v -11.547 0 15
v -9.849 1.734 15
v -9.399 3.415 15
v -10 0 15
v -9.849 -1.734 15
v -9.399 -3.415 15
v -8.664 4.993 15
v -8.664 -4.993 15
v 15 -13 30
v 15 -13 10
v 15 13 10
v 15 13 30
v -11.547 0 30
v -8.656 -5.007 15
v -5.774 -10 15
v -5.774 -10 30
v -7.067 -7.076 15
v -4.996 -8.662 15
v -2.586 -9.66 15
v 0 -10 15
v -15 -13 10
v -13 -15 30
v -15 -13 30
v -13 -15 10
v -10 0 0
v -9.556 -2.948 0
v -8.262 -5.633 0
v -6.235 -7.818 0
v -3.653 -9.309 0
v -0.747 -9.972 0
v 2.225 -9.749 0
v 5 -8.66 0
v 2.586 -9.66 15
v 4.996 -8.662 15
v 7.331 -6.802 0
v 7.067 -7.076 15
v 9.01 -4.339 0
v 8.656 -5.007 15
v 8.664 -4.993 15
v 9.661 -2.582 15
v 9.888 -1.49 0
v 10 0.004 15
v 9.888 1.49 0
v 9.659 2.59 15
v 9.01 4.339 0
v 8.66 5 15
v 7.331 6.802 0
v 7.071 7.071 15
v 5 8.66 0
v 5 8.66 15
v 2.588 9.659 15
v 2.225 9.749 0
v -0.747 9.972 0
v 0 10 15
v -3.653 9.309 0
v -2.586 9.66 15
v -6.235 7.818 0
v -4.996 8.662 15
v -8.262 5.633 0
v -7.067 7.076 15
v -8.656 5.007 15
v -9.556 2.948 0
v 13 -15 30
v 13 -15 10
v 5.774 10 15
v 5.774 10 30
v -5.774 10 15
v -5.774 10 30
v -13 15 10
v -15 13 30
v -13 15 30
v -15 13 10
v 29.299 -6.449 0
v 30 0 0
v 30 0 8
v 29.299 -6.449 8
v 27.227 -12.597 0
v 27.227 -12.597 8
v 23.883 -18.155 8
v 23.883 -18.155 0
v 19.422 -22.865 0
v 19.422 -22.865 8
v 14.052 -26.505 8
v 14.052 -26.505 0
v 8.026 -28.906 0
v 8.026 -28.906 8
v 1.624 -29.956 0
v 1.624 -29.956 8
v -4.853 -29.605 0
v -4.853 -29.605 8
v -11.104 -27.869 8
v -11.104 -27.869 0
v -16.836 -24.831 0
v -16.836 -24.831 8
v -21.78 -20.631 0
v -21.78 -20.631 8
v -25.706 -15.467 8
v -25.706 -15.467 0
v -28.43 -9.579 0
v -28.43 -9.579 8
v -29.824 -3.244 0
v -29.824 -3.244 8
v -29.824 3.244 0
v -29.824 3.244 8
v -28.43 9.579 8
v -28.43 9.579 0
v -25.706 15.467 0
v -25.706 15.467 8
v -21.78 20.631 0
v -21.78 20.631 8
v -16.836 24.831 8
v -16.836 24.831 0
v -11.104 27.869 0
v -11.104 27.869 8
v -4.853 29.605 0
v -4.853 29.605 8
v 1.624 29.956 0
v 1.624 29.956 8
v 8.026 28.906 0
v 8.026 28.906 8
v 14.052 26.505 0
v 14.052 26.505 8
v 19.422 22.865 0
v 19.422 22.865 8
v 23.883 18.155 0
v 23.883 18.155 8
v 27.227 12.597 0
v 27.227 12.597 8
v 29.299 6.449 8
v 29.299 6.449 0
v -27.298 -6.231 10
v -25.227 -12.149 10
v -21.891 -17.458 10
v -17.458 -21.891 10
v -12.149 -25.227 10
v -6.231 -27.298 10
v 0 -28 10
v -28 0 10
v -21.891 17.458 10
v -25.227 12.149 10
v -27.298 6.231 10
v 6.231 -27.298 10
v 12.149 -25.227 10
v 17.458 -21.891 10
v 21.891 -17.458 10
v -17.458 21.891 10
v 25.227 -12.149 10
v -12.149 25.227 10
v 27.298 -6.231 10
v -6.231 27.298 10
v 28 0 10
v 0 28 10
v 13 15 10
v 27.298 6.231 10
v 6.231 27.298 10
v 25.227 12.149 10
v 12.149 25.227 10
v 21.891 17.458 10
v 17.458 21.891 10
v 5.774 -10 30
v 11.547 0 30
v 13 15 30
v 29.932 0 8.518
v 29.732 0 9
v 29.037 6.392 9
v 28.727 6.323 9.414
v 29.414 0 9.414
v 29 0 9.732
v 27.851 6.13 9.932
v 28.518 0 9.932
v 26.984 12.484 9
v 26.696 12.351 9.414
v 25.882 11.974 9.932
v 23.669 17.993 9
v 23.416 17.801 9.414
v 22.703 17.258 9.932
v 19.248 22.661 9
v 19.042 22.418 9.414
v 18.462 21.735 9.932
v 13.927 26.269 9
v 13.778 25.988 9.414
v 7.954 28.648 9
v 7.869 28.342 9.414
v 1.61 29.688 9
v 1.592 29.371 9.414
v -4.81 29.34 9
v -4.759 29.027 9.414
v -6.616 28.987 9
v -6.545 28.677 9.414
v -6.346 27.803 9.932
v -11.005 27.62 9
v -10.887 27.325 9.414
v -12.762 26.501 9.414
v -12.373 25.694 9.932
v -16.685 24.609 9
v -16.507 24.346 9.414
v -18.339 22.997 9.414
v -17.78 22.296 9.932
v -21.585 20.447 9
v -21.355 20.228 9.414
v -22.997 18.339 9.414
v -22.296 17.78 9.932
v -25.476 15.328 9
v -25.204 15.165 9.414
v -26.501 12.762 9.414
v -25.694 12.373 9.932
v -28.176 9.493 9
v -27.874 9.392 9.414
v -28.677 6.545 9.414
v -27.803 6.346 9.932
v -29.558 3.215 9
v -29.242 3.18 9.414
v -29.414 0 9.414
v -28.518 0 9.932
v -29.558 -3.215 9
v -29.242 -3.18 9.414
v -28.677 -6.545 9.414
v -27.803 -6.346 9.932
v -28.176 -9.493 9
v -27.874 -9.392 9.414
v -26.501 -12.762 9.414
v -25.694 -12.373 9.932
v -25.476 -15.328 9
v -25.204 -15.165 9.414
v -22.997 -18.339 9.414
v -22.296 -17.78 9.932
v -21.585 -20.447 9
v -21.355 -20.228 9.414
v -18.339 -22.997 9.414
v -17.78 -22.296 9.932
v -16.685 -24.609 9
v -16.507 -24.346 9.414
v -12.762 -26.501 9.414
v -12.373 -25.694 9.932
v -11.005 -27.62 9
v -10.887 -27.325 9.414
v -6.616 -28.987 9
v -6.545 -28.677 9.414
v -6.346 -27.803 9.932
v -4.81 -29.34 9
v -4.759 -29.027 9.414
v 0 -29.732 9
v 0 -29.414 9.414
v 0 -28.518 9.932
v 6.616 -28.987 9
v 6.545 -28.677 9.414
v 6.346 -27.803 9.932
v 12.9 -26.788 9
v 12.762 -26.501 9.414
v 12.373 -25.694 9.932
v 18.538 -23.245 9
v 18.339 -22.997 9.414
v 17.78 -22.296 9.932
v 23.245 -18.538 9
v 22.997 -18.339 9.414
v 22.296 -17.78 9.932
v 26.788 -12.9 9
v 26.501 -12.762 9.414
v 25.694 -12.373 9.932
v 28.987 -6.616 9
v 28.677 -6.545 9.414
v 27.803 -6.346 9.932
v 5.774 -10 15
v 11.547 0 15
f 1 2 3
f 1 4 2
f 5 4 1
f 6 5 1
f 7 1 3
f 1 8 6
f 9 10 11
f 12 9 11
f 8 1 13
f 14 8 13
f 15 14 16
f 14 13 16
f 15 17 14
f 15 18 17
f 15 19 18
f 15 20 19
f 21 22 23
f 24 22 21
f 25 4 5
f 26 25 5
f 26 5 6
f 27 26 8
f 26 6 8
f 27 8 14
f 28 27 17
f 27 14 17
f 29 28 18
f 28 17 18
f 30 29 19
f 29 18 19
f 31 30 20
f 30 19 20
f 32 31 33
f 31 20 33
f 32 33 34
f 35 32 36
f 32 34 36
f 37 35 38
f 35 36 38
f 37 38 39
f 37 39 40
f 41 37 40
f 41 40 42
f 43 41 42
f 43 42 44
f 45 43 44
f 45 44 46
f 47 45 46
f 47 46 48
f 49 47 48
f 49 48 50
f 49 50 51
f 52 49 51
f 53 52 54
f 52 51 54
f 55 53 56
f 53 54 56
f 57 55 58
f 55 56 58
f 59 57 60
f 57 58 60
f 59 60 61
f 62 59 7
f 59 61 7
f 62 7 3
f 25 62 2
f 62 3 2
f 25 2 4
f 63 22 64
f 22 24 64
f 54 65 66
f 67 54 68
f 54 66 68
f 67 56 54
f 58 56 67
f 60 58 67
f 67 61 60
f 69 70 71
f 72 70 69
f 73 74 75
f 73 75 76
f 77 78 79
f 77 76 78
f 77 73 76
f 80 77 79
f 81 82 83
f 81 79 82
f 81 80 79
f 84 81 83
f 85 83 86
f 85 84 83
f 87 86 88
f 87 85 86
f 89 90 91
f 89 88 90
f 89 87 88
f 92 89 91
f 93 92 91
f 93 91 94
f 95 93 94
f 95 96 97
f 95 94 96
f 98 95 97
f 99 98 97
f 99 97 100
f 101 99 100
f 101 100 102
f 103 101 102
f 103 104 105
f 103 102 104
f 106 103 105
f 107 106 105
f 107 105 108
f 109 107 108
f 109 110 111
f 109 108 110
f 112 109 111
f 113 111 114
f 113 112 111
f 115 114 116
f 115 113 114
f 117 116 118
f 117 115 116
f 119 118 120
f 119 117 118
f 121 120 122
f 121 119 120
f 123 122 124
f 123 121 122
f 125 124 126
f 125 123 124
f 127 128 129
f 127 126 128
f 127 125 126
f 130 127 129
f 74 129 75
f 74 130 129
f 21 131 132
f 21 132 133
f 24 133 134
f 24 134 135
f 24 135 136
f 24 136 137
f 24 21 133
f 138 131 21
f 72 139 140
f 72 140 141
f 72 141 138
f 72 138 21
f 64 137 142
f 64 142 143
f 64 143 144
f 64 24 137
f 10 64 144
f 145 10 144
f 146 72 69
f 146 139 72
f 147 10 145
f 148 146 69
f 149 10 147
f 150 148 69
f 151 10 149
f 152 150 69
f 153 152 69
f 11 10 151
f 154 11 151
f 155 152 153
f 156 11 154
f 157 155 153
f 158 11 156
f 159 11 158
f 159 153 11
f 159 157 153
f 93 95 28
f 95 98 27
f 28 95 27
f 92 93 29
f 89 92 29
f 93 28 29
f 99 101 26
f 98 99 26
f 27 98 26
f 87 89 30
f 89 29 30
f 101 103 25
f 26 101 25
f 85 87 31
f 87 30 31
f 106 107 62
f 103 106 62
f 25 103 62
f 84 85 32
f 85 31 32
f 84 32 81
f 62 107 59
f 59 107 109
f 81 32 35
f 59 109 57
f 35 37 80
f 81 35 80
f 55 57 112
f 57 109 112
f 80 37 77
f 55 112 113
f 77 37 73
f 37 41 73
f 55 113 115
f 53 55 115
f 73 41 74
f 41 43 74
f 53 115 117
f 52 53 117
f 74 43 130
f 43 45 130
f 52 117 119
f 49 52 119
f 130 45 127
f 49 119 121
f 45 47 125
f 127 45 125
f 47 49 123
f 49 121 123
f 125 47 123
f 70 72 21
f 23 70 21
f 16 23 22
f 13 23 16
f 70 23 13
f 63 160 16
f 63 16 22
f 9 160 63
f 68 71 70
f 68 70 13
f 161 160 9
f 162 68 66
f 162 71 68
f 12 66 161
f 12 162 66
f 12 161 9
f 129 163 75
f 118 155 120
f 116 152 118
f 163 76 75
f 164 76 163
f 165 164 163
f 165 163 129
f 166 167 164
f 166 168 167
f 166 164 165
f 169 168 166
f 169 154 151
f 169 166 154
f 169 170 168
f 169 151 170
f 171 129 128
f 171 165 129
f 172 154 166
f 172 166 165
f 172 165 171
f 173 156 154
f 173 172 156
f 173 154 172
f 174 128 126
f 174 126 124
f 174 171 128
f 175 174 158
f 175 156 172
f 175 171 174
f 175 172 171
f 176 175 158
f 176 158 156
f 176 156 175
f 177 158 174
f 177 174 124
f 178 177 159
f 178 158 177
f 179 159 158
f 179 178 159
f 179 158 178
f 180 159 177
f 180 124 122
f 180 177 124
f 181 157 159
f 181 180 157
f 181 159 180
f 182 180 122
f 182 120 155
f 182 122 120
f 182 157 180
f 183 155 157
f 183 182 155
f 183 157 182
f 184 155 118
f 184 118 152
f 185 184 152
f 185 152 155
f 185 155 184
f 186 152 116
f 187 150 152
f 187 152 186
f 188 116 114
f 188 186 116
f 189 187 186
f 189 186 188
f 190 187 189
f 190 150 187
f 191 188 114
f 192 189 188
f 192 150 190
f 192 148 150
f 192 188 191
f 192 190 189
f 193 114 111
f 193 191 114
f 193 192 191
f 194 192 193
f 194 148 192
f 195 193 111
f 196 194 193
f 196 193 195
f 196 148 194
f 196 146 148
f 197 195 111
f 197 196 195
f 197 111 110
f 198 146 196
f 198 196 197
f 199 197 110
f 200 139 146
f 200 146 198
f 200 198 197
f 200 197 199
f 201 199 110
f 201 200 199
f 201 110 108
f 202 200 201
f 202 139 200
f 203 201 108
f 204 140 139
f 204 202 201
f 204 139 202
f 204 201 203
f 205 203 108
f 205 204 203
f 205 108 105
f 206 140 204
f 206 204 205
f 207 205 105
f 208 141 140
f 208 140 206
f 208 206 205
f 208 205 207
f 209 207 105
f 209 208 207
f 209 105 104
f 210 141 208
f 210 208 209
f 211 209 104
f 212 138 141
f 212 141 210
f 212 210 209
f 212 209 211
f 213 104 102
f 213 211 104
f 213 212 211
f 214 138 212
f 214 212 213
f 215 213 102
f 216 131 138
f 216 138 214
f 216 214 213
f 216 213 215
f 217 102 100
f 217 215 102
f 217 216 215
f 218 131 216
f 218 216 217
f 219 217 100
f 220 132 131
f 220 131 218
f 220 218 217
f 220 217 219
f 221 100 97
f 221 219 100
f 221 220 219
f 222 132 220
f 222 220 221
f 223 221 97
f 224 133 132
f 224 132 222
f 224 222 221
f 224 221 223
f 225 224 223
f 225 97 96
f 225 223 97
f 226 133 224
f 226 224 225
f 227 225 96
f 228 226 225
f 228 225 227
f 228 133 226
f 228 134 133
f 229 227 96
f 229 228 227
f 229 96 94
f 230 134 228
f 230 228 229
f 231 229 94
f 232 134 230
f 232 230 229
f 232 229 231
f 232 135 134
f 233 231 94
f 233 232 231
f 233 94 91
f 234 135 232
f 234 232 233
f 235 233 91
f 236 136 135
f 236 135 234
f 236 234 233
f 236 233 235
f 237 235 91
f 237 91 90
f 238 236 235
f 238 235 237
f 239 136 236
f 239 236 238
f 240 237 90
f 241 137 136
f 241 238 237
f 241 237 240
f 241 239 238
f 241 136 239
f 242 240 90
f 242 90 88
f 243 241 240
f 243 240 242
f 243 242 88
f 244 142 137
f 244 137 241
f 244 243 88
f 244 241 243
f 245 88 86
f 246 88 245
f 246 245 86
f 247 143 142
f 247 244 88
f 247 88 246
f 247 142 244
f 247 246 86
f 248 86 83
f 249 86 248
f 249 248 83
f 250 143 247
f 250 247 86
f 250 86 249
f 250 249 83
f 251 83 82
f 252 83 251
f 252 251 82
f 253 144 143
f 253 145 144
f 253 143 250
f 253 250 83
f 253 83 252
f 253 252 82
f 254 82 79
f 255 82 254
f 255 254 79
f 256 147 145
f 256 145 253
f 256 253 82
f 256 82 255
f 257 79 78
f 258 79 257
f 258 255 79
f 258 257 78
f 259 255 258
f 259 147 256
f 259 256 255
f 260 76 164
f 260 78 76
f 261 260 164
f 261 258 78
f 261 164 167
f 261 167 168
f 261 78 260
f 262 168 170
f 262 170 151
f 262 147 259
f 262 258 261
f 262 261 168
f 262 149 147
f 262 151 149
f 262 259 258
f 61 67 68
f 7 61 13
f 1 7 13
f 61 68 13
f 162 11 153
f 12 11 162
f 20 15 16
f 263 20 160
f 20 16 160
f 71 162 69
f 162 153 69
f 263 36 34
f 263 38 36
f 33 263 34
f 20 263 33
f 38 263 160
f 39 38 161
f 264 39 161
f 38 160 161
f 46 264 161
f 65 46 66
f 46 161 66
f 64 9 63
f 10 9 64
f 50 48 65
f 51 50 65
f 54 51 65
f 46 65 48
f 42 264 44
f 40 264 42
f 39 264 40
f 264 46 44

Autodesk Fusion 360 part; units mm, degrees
sketch "Sketch1" plane through (0, 0, 0) normal (0, 0, 1) x (1, 0, 0)
  circle A0 centre (0, 0) radius 30
  line L0 (15, 15) -> (-15, 15)
  line L1 (-15, 15) -> (-15, -15)
  line L2 (-15, -15) -> (15, -15)
  line L3 (15, -15) -> (15, 15)
  line L4 (15, 15) -> (-15, -15) construction
  line L5 (-15, 15) -> (15, -15) construction
  dimension "d1" = 60
  dimension "d2" = 30
  dimension "d3" = 30
extrude "Extrude1" add sketch "Sketch1" along normal blind 10
extrude "Extrude3" add sketch "Sketch1" along normal blind 30 contours L0 L1 L2 L3
sketch "Sketch3" plane through (0, 0, 30) normal (0, 0, 1) x (-1, 0, 0)
  line L0 (5.7735, -10) -> (11.547, 0)
  line L1 (11.547, 0) -> (5.7735, 10)
  line L2 (5.7735, 10) -> (-5.7735, 10)
  line L3 (-5.7735, 10) -> (-11.547, 0)
  line L4 (-11.547, 0) -> (-5.7735, -10)
  line L5 (-5.7735, -10) -> (5.7735, -10)
  dimension "d11" = 20
  dimension "d12" = 23.094
extrude "Extrude4" cut sketch "Sketch3" against normal blind 15
sketch "Sketch4" plane through (0, 0, 30) normal (0, 0, 1) x (-1, 0, 0)
  circle A0 centre (0, 0) radius 10
  line L0 (-5.7735, -10) -> (-11.547, 0)
extrude "Extrude5" cut sketch "Sketch4" against normal blind 55
fillet "Fillet1" radius 2 1 edges at (-27.9698, -10.8485, 10)
chamfer "Chamfer1" distance 2 angle 45 4 edges at (-15, -15, 20) (-15, 15, 20) (15, 15, 20) (15, -15, 20)
sketch "Sketch2" plane through (0, 0, 30) normal (0, 0, 1) x (-1, 0, 0)
  line L0 (0.7735, -12.8868) -> (11.547, -5.7735)
  line L1 (11.547, -5.7735) -> (10.7735, 7.1132)
  line L2 (10.7735, 7.1132) -> (-0.7735, 12.8868)
  line L3 (-0.7735, 12.8868) -> (-11.547, 5.7735)
  line L4 (-11.547, 5.7735) -> (-10.7735, -7.1132)
  line L5 (-10.7735, -7.1132) -> (0.7735, -12.8868)
extrude "Extrude2" [suppressed]
